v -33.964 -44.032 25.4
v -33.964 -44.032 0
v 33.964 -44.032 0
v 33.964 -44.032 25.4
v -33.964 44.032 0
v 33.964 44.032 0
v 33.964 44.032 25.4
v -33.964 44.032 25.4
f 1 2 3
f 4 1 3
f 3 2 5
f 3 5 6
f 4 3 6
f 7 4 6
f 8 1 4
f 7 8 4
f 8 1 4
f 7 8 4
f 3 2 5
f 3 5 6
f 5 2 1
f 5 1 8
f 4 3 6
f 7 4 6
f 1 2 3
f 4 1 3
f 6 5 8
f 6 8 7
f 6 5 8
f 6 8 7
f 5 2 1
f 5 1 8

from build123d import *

# Parameters (mm, degrees)
F0_W     = 67.9279565811
F0_H     = 88.0647003651
F1_DEPTH = 25.4
F2_DEPTH = 25.4


# Not quite as in the source:
# - a feature of the source that left no trace in its solid (it failed there, or was rolled back) is left out


with BuildPart() as f1:
    # F0 (on Top) → F1 (new body)
    with BuildSketch(Plane.XY):
        Rectangle(F0_W, F0_H)
    extrude(amount=F1_DEPTH)


with BuildPart() as f2:
    # F0 (on Top) → F2 (new body)
    with BuildSketch(Plane.XY):
        Rectangle(F0_W, F0_H)
    extrude(amount=F2_DEPTH)


solid = Compound([f1.part, f2.part])
